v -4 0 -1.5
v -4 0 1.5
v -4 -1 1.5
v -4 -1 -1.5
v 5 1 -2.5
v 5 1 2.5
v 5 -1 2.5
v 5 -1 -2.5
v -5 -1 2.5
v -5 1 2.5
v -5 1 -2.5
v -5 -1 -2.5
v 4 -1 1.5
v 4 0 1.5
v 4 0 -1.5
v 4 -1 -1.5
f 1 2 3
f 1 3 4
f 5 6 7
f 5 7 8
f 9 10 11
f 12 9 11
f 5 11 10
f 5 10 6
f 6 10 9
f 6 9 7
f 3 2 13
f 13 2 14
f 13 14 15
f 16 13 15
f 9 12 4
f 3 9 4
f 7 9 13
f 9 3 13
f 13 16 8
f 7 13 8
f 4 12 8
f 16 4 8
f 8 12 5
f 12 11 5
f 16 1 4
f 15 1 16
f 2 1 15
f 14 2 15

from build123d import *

# Parameters (mm, degrees)
SKETCH1_W           = 10
SKETCH1_H           = 5
BOSS_EXTRUDE1_DEPTH = 1
SKETCH1_3_W         = 10
SKETCH1_3_H         = 5
BOSS_EXTRUDE2_DEPTH = 1


with BuildPart() as part:
    # Sketch1 → Boss-Extrude1 (new body)
    with BuildSketch(Plane(origin=(0, 0, 0), x_dir=(1, 0, 0), z_dir=(0, 1, 0))):
        Rectangle(SKETCH1_W, SKETCH1_H)
    extrude(amount=BOSS_EXTRUDE1_DEPTH)

    # Sketch1<3> → Boss-Extrude2 (add)
    with BuildSketch(Plane(origin=(0, 0, 0), x_dir=(1, 0, 0), z_dir=(0, 1, 0))):
        Rectangle(SKETCH1_3_W, SKETCH1_3_H)
        Polygon((-2.5, -1.5), (-4, -1.5), (-4, 0), (-4, 1.5), (-2.5, 1.5), (2.5, 1.5), (4, 1.5), (4, 0), (4, -1.5), (2.5, -1.5), align=None, mode=Mode.SUBTRACT)
    extrude(amount=-BOSS_EXTRUDE2_DEPTH)


solid = part.part
